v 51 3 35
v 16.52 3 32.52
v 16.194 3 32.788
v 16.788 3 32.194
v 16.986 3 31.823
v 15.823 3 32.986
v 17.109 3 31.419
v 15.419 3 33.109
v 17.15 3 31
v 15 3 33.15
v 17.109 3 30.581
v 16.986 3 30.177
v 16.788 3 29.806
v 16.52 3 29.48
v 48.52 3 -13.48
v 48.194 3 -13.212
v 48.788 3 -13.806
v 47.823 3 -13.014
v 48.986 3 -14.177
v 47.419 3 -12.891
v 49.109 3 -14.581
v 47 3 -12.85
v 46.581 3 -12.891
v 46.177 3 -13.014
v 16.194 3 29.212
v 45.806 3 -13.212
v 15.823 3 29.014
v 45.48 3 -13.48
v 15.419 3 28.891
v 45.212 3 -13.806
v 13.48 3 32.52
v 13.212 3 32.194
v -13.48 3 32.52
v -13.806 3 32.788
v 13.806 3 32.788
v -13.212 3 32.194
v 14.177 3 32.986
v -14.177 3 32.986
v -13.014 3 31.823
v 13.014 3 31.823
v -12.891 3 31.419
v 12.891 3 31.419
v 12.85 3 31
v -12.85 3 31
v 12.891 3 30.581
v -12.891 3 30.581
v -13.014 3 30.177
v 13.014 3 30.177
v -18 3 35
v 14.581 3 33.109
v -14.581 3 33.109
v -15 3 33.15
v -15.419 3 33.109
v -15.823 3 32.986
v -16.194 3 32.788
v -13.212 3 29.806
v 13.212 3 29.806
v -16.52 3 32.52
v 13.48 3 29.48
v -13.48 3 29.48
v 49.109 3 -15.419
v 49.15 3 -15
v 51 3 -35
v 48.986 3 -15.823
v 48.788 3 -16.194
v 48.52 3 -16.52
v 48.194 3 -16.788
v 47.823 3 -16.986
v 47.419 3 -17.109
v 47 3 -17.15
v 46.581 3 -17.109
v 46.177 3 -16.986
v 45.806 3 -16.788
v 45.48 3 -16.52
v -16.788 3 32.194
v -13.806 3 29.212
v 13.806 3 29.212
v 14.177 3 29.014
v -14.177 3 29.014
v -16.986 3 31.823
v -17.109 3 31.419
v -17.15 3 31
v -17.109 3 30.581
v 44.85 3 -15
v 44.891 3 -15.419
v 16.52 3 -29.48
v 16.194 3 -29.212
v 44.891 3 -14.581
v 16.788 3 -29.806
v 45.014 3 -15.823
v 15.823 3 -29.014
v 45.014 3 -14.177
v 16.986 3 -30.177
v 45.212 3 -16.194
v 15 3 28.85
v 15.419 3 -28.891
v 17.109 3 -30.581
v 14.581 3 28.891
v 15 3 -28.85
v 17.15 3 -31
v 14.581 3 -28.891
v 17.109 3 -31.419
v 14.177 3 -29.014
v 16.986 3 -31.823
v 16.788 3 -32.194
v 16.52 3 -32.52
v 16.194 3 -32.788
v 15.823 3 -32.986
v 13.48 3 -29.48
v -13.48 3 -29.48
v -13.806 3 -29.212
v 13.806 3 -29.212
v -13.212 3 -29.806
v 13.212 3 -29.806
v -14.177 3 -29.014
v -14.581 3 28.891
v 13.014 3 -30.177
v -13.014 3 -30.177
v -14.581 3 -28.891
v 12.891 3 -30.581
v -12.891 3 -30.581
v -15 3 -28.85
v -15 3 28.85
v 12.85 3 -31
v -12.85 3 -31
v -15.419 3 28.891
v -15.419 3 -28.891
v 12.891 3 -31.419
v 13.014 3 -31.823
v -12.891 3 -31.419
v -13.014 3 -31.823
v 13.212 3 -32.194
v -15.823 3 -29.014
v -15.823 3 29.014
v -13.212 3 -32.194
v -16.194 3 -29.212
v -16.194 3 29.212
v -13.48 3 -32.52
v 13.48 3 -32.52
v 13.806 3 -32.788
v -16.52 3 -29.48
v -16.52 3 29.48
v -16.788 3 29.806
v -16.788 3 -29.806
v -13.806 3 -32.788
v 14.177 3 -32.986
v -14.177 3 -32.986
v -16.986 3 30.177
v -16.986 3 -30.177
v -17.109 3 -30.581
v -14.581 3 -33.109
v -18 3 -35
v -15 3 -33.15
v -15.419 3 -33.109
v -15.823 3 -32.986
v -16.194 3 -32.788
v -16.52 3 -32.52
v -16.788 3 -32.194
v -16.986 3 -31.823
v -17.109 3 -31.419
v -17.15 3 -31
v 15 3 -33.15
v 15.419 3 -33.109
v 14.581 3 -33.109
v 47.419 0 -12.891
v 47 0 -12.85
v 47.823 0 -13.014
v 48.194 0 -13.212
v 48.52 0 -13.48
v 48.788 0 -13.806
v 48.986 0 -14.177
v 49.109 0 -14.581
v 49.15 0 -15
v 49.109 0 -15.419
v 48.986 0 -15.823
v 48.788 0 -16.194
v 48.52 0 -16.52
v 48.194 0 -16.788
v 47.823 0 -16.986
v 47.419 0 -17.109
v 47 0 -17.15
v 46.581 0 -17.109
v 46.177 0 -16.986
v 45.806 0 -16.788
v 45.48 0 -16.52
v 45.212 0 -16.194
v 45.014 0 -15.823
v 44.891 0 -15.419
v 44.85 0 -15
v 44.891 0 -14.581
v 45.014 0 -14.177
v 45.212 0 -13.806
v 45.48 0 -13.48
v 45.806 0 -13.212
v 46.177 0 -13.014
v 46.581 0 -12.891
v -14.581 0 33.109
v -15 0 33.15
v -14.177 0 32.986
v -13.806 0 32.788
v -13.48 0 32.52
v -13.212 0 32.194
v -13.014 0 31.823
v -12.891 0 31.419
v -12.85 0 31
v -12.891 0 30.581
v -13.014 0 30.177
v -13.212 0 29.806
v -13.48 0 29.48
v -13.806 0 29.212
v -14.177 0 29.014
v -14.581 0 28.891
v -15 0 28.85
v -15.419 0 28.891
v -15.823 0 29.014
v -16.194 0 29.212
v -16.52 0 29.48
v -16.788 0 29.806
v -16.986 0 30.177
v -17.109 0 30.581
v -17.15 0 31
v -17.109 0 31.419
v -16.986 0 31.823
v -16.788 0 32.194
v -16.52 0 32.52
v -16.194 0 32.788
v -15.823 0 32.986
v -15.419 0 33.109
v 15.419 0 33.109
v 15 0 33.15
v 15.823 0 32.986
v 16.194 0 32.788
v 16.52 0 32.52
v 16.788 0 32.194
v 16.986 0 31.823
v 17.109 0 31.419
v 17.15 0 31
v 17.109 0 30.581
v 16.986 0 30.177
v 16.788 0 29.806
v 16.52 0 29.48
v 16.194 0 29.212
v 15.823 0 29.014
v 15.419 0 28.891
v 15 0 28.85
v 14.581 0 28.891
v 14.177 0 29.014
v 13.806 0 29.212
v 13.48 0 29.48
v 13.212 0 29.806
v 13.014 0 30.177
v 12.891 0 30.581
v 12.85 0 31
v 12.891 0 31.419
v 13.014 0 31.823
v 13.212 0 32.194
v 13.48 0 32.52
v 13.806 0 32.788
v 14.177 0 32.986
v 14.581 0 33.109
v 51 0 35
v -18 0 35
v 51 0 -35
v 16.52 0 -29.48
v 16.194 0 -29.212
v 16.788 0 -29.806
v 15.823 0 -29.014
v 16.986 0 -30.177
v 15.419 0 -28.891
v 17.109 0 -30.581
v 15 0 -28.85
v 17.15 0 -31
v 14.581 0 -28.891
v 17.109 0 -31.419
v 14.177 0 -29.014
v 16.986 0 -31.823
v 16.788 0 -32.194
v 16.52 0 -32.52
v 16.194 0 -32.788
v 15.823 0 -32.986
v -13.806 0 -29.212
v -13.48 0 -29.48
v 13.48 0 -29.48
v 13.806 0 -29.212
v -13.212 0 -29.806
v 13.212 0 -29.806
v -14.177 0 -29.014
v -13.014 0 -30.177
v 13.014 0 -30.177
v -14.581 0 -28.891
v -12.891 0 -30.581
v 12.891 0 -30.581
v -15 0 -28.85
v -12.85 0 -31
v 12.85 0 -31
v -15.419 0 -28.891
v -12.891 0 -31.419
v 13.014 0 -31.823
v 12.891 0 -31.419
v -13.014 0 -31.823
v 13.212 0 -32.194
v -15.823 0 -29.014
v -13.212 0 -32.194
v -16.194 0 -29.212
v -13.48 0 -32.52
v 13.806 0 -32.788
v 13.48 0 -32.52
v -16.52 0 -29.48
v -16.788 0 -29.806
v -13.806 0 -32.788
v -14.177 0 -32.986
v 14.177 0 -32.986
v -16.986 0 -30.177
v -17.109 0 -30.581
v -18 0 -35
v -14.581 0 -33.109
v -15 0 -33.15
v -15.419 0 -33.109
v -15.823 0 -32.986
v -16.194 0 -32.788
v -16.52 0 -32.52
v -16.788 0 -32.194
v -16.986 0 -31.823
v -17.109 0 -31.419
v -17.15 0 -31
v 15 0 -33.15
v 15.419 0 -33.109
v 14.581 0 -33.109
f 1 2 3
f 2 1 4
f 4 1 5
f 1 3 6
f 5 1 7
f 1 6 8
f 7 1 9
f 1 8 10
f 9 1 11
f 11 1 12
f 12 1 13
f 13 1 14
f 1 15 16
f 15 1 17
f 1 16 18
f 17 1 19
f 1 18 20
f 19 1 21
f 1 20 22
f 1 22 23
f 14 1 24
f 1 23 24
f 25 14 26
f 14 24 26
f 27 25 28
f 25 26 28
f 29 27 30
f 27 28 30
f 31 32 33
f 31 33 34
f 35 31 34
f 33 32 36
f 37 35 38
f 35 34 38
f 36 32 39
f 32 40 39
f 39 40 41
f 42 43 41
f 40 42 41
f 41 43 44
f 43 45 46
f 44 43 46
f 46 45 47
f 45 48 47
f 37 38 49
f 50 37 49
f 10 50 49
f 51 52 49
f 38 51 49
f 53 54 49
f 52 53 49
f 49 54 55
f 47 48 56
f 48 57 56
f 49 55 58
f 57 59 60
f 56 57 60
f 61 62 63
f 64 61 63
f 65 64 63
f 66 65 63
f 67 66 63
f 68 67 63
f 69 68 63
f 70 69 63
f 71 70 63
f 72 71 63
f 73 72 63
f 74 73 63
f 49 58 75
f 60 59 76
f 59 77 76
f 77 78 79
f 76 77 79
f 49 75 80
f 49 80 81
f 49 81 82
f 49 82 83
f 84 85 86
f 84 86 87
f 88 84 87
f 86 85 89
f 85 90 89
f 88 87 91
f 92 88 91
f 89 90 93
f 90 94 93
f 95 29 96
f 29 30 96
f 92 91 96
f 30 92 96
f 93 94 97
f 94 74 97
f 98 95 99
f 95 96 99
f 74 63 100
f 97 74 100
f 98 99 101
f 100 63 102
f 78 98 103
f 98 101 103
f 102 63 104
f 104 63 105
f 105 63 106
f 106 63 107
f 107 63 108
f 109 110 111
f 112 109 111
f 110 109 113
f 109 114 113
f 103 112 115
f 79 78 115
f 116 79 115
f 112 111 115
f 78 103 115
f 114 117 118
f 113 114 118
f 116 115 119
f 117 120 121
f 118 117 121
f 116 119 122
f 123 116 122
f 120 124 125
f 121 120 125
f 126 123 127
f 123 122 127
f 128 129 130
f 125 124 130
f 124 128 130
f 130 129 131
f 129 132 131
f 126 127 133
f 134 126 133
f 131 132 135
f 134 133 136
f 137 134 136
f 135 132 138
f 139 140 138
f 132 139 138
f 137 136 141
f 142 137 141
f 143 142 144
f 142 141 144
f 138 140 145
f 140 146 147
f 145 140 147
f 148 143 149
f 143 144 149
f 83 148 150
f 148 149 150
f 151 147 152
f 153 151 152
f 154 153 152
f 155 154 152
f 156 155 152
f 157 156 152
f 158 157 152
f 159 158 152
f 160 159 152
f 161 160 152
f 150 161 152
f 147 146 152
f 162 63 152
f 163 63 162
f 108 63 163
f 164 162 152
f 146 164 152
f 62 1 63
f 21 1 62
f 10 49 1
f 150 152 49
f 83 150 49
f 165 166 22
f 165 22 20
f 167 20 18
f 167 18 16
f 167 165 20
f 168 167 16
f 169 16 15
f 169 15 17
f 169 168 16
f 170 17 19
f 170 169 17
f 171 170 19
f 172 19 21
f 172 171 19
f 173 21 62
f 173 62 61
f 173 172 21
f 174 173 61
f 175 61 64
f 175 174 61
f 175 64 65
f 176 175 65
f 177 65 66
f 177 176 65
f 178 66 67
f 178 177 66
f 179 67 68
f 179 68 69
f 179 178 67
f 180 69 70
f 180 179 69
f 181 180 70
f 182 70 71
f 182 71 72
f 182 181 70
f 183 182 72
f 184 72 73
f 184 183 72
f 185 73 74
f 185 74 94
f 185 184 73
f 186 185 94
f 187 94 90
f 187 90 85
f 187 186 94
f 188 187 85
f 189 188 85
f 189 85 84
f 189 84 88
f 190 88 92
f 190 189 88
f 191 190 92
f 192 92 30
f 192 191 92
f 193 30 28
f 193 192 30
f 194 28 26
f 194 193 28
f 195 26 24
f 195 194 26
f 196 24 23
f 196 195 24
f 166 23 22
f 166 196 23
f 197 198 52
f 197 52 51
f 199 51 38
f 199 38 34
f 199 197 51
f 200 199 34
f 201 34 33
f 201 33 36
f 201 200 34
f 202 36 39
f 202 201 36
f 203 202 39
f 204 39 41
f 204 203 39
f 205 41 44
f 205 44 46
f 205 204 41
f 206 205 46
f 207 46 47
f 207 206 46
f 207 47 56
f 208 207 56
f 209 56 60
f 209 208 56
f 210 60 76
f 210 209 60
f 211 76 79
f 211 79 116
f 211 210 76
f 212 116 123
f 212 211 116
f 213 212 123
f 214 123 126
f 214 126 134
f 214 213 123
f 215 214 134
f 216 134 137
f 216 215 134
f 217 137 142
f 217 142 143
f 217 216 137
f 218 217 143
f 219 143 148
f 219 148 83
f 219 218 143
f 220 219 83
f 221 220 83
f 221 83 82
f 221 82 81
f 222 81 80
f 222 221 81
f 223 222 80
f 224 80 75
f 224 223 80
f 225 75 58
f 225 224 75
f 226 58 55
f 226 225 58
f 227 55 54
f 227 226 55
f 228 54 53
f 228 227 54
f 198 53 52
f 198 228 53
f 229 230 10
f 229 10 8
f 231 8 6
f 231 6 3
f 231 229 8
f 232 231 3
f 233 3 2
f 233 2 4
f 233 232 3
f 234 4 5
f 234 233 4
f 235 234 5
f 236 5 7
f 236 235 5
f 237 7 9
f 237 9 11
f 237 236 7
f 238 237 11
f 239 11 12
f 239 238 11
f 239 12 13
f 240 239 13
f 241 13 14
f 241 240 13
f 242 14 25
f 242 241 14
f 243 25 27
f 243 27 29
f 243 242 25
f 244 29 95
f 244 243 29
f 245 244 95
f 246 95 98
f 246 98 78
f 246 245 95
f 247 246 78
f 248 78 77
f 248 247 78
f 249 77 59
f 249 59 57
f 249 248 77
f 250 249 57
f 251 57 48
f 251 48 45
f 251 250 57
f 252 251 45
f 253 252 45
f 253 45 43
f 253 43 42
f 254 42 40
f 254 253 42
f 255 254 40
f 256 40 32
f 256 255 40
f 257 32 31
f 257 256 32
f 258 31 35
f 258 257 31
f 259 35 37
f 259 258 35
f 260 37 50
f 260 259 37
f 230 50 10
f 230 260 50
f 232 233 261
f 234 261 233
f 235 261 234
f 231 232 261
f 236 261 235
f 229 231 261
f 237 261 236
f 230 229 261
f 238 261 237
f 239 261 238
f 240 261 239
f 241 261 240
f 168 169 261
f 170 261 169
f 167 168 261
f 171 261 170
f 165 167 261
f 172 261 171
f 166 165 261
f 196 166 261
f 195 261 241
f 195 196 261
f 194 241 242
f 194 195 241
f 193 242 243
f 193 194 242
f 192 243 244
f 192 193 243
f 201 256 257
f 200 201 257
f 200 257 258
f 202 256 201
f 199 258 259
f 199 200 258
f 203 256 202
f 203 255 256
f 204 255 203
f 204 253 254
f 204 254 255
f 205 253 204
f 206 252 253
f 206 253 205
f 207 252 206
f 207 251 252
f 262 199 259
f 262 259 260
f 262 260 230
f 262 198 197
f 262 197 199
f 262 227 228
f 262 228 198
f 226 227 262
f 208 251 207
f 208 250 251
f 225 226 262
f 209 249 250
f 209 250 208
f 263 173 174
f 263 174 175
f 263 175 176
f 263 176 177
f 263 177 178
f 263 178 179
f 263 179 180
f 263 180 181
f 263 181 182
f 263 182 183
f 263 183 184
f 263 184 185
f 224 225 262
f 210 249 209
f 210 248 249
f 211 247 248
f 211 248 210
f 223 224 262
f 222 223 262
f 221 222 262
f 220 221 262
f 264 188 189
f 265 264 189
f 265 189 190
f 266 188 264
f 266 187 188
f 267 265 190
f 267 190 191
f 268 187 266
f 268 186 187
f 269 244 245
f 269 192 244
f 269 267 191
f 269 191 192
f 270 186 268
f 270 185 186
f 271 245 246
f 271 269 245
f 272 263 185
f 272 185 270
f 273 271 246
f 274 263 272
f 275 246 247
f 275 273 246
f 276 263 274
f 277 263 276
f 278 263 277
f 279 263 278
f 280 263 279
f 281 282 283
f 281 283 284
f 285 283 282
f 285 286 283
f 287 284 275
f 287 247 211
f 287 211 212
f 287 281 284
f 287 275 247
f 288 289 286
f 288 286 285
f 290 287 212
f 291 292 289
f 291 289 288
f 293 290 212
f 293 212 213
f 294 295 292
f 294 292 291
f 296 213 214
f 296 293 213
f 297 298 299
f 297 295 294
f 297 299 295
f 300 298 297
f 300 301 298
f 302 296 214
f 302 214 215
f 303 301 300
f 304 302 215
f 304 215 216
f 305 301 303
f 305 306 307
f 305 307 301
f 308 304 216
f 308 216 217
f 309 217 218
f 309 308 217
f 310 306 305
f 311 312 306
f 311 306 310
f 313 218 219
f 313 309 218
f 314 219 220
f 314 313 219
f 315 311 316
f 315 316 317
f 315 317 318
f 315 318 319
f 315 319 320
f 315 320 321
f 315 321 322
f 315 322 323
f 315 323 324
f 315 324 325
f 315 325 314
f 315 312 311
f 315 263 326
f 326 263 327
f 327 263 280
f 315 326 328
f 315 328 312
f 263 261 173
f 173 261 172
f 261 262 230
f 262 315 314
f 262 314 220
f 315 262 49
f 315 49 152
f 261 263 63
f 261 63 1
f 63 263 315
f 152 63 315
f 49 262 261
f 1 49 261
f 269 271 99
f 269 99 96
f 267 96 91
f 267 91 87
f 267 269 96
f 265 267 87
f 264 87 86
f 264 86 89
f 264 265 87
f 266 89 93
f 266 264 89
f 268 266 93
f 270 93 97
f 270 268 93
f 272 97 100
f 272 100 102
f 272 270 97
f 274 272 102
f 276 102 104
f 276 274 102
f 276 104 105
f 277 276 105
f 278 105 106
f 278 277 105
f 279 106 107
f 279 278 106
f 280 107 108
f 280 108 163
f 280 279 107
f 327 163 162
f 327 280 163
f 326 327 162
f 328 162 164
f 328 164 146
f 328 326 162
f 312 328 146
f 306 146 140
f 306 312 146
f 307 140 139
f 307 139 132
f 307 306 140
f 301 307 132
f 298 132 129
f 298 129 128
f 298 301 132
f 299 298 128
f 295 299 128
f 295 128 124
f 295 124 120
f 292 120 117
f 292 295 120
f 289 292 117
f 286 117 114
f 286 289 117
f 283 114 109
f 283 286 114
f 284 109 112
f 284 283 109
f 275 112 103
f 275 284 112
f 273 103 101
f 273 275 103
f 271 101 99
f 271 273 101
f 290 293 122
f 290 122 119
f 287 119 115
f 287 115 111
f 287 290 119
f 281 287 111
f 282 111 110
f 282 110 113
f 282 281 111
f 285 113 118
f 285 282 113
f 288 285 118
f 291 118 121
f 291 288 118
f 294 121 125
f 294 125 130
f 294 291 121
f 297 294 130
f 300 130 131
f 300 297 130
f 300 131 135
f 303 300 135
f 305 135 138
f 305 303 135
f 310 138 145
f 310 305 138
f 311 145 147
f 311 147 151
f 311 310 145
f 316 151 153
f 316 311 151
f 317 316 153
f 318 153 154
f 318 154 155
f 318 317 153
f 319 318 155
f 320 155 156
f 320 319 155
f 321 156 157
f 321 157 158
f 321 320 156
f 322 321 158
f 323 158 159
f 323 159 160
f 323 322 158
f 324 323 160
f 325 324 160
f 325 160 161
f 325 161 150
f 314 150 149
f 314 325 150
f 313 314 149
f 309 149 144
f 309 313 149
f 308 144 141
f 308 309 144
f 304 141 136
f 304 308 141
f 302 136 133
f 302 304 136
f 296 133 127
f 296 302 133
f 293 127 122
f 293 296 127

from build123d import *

# Parameters (mm, degrees)
SKETCH1_R           = 2.15
BOSS_EXTRUDE1_DEPTH = 3


with BuildPart() as part:
    # Sketch1 → Boss-Extrude1 (new body)
    with BuildSketch(Plane(origin=(0, 0, 0), x_dir=(1, 0, 0), z_dir=(0, 1, 0))):
        Polygon((18, 35), (51, 35), (51, -35), (18, -35), (-18, -35), (-18, 35), align=None)
        with Locations(Location((15, 31, 0), (0, 0, 270))):
            Circle(SKETCH1_R, mode=Mode.SUBTRACT)
        with Locations(Location((-15, 31, 0), (0, 0, 270))):
            Circle(SKETCH1_R, mode=Mode.SUBTRACT)
        with Locations(Location((-15, -31, 0), (0, 0, 270))):
            Circle(SKETCH1_R, mode=Mode.SUBTRACT)
        with Locations(Location((15, -31, 0), (0, 0, 270))):
            Circle(SKETCH1_R, mode=Mode.SUBTRACT)
        with Locations(Location((47, 15, 0), (0, 0, 270))):
            Circle(SKETCH1_R, mode=Mode.SUBTRACT)
    extrude(amount=BOSS_EXTRUDE1_DEPTH)


solid = part.part
